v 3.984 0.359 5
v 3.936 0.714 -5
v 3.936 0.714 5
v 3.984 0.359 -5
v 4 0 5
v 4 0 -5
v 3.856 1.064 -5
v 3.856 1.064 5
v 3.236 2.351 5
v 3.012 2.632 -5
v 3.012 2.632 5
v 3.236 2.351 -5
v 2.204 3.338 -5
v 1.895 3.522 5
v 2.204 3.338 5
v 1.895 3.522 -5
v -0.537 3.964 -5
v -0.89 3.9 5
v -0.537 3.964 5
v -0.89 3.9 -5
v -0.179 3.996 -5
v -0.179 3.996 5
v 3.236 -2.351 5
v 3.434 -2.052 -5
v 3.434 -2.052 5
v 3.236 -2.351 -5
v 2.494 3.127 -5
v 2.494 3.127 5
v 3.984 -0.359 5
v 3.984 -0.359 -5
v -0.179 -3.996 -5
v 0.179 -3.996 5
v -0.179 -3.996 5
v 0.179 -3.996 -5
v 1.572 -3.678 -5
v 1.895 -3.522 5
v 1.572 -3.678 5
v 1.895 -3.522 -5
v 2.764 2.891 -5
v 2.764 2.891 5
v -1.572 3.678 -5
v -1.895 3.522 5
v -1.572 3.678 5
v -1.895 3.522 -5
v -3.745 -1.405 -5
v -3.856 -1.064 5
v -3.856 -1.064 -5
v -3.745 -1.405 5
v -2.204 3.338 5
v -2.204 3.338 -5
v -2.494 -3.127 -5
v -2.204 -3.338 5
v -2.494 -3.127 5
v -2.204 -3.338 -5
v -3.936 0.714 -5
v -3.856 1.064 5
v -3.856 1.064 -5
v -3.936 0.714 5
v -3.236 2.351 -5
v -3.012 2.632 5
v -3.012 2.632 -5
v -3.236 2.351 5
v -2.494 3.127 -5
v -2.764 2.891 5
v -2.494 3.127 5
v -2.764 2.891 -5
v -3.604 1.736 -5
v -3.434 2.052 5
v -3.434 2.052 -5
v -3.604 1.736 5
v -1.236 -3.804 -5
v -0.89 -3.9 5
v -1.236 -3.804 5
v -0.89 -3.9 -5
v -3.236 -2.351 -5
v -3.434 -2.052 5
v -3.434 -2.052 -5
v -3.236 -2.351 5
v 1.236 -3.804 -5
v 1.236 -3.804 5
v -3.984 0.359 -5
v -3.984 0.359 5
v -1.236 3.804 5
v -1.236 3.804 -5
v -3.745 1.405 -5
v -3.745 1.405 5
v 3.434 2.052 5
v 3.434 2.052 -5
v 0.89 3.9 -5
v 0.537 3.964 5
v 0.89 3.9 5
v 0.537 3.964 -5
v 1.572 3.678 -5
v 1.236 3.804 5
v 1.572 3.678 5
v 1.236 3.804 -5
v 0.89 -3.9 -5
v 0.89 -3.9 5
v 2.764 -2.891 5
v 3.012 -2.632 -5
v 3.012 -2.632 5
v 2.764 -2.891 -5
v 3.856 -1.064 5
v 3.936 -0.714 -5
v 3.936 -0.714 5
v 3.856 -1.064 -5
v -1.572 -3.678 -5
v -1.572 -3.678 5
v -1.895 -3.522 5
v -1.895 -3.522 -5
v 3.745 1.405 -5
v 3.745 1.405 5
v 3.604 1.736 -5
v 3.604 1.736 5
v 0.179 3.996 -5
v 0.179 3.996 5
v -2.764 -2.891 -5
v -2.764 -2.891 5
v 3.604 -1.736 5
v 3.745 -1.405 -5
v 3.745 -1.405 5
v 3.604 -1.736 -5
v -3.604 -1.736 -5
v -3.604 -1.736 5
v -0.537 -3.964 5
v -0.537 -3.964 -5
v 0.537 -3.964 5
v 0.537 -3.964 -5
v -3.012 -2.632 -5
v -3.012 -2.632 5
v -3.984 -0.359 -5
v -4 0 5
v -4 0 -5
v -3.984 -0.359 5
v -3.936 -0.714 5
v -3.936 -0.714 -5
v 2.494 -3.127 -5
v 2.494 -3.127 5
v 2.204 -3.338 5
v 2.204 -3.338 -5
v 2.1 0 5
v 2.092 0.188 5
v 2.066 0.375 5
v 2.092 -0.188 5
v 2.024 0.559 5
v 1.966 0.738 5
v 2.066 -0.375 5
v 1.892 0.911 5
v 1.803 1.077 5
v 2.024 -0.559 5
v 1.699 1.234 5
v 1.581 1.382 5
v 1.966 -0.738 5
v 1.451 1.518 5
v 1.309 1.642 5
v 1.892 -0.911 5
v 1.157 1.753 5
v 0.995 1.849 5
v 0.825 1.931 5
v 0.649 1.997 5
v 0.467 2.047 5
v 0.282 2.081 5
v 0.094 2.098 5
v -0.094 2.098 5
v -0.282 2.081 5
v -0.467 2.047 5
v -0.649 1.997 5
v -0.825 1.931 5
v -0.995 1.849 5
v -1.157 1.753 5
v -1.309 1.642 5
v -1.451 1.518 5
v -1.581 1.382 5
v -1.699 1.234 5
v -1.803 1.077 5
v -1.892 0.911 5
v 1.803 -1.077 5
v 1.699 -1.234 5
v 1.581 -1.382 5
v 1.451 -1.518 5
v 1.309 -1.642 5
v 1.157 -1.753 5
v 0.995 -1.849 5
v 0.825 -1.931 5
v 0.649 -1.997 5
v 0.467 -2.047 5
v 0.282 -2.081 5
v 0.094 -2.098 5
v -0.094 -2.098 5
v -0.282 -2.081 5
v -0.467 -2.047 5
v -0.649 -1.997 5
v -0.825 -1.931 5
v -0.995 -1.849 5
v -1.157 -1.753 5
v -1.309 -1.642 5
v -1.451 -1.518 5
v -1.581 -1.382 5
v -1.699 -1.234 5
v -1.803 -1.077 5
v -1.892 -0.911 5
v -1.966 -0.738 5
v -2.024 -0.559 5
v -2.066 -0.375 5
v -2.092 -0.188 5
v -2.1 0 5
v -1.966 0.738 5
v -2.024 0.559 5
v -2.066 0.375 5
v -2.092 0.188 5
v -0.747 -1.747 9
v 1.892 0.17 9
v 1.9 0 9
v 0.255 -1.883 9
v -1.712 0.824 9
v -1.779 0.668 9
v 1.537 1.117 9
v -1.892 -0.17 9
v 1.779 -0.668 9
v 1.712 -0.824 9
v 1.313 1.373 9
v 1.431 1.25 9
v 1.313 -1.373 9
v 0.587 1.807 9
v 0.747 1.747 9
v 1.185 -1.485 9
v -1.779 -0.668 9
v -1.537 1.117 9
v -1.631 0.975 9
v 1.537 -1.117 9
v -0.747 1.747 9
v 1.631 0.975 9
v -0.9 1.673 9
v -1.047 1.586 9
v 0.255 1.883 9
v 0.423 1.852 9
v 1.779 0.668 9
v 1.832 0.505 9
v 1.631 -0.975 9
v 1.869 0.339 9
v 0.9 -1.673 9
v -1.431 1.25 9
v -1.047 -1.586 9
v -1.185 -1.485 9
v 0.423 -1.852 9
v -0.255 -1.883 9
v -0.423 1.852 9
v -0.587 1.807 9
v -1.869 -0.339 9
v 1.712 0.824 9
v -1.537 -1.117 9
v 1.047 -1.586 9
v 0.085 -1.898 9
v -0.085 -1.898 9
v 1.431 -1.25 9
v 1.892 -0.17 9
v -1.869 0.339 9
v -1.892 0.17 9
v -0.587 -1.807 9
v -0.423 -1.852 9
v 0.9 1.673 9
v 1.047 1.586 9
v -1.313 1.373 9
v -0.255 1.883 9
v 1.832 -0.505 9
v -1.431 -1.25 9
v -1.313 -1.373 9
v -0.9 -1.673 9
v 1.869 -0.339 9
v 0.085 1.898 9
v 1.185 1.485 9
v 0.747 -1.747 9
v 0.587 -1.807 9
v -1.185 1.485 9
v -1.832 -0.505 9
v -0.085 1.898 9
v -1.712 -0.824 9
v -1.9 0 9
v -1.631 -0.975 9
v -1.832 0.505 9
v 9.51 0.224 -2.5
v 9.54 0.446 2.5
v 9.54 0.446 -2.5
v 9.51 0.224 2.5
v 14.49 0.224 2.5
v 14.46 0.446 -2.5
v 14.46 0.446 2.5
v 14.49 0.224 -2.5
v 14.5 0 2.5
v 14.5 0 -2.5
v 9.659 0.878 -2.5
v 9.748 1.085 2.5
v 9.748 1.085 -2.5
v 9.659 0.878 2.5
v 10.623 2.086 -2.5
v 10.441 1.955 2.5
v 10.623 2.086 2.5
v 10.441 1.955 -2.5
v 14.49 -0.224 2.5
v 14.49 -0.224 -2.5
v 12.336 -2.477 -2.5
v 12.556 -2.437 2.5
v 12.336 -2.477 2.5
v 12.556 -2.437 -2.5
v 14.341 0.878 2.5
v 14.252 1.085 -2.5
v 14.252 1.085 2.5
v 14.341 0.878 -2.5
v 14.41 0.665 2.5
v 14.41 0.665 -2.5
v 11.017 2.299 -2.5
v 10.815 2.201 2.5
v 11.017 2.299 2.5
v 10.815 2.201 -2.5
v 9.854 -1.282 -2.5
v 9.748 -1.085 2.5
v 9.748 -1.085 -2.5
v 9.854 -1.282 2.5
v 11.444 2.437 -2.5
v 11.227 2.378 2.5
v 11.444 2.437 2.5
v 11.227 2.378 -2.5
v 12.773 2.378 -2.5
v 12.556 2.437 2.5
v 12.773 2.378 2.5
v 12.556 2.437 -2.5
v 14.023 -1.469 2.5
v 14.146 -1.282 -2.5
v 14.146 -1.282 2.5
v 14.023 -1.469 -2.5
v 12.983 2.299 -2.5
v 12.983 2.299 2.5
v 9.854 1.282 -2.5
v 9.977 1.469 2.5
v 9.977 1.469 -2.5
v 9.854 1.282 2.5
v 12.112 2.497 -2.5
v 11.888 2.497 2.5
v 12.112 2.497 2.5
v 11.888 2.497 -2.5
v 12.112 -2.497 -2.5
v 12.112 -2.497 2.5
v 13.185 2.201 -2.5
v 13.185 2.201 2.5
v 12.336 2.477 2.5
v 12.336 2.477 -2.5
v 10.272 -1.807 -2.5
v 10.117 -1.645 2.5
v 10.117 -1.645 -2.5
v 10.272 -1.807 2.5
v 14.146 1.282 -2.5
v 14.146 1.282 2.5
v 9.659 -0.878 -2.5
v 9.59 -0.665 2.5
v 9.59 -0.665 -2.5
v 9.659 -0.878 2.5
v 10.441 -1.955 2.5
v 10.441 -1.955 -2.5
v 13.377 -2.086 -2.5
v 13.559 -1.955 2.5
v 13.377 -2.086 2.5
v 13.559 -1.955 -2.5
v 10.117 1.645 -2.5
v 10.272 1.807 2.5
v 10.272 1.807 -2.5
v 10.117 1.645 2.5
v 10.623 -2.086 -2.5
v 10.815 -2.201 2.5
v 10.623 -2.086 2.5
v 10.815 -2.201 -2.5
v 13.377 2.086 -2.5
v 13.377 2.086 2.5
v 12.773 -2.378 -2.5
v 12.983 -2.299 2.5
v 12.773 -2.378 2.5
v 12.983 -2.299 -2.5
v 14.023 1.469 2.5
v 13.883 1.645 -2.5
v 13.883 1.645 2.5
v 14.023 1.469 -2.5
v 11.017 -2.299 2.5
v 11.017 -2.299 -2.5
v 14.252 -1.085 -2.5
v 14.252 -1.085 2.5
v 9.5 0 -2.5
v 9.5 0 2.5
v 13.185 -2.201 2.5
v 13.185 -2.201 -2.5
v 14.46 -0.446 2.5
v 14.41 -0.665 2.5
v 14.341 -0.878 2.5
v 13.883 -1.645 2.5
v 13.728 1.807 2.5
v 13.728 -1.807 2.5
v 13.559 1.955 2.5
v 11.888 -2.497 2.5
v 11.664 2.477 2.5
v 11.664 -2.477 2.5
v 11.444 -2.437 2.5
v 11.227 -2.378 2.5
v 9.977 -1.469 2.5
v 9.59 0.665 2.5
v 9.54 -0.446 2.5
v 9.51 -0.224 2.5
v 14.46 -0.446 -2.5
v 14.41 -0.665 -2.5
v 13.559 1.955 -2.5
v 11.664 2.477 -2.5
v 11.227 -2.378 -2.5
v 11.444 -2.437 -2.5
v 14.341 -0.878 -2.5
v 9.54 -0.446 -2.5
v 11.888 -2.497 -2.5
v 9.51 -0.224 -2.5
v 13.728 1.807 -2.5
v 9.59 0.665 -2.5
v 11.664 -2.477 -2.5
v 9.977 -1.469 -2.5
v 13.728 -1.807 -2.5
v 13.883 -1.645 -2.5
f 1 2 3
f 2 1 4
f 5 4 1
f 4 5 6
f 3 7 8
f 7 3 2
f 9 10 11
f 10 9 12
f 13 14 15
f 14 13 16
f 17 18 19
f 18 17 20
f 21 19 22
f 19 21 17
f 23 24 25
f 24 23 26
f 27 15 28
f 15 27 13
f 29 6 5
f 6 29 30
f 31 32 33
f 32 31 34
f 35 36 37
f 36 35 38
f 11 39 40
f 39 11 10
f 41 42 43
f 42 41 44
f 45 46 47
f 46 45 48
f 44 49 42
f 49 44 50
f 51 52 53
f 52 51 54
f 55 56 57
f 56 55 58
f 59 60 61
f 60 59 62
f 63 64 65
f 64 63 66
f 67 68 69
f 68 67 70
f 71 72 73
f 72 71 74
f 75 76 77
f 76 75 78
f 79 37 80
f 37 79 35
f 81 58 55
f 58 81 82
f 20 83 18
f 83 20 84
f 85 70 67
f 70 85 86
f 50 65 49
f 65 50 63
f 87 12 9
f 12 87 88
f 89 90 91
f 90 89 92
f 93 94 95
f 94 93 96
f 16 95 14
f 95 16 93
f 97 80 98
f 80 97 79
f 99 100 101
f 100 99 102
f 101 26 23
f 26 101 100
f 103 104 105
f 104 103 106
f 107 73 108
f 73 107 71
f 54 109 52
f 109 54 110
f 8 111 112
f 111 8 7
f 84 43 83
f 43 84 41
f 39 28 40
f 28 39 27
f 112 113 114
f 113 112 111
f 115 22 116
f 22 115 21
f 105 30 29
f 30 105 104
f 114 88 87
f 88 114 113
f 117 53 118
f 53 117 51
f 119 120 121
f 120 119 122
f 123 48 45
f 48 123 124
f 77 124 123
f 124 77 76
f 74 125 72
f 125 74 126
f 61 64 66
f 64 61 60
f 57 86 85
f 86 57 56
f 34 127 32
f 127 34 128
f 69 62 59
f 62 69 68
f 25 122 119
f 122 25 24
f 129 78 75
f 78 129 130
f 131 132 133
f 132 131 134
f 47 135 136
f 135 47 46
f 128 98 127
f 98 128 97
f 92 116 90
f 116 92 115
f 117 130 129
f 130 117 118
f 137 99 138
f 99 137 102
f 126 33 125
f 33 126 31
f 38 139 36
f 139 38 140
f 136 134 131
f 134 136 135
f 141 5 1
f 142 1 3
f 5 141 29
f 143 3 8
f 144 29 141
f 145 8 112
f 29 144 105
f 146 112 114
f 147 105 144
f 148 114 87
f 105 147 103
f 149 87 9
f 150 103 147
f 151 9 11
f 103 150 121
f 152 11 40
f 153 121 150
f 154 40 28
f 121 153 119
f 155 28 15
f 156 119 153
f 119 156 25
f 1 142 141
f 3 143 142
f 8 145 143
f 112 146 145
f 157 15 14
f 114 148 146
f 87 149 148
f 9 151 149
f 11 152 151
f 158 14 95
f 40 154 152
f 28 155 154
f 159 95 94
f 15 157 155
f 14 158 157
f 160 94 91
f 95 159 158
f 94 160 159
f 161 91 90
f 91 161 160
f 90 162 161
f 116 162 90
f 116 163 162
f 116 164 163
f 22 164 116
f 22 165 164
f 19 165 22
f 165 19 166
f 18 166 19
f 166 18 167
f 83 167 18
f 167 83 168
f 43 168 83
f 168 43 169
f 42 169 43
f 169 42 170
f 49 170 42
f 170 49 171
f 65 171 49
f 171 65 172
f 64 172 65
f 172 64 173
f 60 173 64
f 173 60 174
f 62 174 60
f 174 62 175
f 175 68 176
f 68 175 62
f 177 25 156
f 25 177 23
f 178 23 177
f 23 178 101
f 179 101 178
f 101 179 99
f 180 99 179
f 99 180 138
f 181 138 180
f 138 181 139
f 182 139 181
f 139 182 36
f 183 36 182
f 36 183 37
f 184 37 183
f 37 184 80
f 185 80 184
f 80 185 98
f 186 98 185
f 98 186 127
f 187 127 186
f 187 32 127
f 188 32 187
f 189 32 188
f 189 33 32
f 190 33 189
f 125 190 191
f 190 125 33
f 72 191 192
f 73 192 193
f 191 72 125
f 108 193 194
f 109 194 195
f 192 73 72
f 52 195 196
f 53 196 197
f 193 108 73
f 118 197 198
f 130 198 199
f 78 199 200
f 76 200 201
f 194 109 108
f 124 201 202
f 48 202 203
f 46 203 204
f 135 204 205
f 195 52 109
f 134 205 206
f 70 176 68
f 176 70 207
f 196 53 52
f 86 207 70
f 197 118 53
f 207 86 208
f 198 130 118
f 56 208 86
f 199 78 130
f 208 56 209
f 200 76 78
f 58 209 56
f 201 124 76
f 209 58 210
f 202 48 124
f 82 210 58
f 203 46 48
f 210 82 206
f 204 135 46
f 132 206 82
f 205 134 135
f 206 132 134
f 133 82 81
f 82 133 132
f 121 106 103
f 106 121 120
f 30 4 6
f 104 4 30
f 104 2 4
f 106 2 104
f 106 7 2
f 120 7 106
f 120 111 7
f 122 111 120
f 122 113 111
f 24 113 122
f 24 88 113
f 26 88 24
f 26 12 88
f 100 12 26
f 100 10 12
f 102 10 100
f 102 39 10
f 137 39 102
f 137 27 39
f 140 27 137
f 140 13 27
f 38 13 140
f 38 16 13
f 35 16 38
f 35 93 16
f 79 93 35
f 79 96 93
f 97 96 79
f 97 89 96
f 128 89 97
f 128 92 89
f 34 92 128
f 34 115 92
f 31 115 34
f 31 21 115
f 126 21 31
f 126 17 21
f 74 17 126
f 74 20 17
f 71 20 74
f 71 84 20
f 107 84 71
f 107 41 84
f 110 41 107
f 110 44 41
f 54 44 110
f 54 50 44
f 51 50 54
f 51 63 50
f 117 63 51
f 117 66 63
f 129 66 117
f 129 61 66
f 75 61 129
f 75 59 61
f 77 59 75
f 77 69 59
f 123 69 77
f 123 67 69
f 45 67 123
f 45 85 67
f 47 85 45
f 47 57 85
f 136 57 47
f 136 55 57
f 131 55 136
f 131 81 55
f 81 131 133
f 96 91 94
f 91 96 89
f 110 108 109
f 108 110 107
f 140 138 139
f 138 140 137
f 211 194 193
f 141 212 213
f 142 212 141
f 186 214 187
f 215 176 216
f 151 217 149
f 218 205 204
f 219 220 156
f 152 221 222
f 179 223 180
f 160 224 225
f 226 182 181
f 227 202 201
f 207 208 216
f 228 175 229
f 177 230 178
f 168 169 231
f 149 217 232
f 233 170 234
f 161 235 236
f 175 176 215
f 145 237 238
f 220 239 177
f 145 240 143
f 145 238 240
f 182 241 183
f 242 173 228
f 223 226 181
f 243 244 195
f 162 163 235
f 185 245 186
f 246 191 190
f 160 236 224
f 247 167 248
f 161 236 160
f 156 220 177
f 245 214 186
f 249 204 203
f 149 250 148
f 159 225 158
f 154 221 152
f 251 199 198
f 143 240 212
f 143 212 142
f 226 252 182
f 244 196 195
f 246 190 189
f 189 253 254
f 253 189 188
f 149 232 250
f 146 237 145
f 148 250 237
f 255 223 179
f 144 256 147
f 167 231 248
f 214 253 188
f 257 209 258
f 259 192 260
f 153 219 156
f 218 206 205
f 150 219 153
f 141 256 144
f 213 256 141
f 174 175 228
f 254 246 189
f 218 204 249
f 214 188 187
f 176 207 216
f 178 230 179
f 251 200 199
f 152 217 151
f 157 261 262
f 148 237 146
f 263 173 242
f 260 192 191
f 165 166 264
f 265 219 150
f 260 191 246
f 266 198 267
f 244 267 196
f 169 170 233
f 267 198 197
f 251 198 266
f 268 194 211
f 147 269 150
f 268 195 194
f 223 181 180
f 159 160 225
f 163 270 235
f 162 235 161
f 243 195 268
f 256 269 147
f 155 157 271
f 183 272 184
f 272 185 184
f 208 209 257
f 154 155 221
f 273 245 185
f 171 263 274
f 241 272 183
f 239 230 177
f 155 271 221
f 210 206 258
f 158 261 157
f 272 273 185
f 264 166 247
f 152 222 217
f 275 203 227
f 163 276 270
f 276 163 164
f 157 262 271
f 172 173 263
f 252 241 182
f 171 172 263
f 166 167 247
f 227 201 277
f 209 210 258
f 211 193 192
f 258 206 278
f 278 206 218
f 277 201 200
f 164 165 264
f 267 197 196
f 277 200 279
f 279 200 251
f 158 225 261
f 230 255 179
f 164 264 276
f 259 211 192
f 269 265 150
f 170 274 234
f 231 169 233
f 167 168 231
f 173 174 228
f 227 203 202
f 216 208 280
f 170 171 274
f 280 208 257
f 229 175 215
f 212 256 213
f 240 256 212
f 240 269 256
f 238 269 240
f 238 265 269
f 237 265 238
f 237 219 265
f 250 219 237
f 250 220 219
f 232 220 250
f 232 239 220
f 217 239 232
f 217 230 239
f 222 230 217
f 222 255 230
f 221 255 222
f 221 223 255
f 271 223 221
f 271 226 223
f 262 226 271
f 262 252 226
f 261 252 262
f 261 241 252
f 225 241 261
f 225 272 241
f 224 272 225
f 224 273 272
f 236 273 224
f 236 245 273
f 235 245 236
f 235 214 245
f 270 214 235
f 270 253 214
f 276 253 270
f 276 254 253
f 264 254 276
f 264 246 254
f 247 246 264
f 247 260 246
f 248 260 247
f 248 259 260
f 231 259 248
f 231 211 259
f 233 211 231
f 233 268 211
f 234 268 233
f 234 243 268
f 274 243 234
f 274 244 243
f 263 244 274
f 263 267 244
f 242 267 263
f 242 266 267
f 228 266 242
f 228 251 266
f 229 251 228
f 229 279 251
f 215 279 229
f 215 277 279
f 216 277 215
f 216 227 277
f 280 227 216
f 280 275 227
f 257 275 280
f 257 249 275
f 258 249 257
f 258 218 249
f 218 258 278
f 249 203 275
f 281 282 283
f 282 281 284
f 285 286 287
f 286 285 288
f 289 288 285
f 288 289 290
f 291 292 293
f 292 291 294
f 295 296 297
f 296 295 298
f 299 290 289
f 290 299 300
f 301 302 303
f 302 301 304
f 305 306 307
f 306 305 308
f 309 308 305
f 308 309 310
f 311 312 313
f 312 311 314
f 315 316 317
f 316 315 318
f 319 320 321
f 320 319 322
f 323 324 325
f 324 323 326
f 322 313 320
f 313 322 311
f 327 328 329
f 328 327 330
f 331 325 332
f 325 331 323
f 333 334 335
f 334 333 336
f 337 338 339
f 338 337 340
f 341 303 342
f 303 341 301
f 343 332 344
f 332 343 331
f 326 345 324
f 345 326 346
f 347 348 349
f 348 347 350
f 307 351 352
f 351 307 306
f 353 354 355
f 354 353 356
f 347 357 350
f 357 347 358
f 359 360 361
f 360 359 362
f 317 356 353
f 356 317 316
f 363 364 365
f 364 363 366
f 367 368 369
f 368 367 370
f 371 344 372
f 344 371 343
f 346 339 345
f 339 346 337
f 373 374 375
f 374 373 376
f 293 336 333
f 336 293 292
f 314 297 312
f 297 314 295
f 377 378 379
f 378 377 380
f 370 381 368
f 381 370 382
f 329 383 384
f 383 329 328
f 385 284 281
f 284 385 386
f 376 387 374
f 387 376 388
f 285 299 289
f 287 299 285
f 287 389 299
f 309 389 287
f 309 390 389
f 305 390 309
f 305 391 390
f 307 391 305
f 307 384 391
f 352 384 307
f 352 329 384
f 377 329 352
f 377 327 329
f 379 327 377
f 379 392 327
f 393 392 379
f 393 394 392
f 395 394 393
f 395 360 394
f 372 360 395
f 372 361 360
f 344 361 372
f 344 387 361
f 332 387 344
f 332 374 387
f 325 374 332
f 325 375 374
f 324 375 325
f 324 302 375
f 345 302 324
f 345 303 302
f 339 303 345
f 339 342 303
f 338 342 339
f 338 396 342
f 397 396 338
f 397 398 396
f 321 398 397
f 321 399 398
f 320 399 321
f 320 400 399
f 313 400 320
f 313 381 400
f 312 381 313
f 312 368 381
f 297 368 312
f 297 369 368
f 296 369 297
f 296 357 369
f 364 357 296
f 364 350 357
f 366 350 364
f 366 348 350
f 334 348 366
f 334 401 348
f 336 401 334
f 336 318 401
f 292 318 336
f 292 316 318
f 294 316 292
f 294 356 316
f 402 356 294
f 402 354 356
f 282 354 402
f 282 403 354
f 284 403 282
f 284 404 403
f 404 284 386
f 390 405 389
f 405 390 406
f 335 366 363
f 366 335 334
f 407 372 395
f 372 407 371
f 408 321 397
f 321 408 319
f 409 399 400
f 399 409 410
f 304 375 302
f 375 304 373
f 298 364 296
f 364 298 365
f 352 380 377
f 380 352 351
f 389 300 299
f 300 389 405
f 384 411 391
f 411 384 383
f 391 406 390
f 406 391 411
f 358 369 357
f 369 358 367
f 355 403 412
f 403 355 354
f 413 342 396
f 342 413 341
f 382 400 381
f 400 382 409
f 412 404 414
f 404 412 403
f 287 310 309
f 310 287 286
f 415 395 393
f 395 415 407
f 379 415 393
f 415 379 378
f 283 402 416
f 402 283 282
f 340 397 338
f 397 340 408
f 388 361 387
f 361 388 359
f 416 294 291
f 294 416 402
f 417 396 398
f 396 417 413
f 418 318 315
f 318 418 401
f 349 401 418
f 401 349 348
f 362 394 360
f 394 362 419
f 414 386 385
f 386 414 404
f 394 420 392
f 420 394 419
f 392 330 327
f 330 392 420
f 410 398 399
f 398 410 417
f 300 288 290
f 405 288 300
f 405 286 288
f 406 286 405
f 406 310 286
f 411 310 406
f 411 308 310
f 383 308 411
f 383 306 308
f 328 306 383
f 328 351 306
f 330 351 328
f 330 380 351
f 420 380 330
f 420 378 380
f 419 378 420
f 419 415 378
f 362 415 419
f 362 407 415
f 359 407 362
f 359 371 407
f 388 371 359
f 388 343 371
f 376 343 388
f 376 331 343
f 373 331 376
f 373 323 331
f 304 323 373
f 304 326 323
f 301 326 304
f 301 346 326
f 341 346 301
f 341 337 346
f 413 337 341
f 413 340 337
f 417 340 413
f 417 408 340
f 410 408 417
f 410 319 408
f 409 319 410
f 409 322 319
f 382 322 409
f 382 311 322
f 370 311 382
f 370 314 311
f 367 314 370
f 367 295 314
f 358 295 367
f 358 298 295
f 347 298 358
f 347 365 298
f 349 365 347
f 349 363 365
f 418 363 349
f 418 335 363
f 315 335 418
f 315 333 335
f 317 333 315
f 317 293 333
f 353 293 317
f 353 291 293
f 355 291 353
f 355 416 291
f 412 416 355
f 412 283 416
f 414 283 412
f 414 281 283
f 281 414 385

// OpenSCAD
$fn=70;


color( "SlateGray", 1.0 )

cylinder(h = 10, r1 = 4, r2 = 4, center = true);

translate([0,0,7])
cylinder(h = 4, r1 = 2.1, r2 = 1.9, center = true);


translate([12,0,0])
color( "LightSlateGray", 1.0 )
cylinder(h = 5, r1 = 2.5, r2 = 2.5, center = true);
